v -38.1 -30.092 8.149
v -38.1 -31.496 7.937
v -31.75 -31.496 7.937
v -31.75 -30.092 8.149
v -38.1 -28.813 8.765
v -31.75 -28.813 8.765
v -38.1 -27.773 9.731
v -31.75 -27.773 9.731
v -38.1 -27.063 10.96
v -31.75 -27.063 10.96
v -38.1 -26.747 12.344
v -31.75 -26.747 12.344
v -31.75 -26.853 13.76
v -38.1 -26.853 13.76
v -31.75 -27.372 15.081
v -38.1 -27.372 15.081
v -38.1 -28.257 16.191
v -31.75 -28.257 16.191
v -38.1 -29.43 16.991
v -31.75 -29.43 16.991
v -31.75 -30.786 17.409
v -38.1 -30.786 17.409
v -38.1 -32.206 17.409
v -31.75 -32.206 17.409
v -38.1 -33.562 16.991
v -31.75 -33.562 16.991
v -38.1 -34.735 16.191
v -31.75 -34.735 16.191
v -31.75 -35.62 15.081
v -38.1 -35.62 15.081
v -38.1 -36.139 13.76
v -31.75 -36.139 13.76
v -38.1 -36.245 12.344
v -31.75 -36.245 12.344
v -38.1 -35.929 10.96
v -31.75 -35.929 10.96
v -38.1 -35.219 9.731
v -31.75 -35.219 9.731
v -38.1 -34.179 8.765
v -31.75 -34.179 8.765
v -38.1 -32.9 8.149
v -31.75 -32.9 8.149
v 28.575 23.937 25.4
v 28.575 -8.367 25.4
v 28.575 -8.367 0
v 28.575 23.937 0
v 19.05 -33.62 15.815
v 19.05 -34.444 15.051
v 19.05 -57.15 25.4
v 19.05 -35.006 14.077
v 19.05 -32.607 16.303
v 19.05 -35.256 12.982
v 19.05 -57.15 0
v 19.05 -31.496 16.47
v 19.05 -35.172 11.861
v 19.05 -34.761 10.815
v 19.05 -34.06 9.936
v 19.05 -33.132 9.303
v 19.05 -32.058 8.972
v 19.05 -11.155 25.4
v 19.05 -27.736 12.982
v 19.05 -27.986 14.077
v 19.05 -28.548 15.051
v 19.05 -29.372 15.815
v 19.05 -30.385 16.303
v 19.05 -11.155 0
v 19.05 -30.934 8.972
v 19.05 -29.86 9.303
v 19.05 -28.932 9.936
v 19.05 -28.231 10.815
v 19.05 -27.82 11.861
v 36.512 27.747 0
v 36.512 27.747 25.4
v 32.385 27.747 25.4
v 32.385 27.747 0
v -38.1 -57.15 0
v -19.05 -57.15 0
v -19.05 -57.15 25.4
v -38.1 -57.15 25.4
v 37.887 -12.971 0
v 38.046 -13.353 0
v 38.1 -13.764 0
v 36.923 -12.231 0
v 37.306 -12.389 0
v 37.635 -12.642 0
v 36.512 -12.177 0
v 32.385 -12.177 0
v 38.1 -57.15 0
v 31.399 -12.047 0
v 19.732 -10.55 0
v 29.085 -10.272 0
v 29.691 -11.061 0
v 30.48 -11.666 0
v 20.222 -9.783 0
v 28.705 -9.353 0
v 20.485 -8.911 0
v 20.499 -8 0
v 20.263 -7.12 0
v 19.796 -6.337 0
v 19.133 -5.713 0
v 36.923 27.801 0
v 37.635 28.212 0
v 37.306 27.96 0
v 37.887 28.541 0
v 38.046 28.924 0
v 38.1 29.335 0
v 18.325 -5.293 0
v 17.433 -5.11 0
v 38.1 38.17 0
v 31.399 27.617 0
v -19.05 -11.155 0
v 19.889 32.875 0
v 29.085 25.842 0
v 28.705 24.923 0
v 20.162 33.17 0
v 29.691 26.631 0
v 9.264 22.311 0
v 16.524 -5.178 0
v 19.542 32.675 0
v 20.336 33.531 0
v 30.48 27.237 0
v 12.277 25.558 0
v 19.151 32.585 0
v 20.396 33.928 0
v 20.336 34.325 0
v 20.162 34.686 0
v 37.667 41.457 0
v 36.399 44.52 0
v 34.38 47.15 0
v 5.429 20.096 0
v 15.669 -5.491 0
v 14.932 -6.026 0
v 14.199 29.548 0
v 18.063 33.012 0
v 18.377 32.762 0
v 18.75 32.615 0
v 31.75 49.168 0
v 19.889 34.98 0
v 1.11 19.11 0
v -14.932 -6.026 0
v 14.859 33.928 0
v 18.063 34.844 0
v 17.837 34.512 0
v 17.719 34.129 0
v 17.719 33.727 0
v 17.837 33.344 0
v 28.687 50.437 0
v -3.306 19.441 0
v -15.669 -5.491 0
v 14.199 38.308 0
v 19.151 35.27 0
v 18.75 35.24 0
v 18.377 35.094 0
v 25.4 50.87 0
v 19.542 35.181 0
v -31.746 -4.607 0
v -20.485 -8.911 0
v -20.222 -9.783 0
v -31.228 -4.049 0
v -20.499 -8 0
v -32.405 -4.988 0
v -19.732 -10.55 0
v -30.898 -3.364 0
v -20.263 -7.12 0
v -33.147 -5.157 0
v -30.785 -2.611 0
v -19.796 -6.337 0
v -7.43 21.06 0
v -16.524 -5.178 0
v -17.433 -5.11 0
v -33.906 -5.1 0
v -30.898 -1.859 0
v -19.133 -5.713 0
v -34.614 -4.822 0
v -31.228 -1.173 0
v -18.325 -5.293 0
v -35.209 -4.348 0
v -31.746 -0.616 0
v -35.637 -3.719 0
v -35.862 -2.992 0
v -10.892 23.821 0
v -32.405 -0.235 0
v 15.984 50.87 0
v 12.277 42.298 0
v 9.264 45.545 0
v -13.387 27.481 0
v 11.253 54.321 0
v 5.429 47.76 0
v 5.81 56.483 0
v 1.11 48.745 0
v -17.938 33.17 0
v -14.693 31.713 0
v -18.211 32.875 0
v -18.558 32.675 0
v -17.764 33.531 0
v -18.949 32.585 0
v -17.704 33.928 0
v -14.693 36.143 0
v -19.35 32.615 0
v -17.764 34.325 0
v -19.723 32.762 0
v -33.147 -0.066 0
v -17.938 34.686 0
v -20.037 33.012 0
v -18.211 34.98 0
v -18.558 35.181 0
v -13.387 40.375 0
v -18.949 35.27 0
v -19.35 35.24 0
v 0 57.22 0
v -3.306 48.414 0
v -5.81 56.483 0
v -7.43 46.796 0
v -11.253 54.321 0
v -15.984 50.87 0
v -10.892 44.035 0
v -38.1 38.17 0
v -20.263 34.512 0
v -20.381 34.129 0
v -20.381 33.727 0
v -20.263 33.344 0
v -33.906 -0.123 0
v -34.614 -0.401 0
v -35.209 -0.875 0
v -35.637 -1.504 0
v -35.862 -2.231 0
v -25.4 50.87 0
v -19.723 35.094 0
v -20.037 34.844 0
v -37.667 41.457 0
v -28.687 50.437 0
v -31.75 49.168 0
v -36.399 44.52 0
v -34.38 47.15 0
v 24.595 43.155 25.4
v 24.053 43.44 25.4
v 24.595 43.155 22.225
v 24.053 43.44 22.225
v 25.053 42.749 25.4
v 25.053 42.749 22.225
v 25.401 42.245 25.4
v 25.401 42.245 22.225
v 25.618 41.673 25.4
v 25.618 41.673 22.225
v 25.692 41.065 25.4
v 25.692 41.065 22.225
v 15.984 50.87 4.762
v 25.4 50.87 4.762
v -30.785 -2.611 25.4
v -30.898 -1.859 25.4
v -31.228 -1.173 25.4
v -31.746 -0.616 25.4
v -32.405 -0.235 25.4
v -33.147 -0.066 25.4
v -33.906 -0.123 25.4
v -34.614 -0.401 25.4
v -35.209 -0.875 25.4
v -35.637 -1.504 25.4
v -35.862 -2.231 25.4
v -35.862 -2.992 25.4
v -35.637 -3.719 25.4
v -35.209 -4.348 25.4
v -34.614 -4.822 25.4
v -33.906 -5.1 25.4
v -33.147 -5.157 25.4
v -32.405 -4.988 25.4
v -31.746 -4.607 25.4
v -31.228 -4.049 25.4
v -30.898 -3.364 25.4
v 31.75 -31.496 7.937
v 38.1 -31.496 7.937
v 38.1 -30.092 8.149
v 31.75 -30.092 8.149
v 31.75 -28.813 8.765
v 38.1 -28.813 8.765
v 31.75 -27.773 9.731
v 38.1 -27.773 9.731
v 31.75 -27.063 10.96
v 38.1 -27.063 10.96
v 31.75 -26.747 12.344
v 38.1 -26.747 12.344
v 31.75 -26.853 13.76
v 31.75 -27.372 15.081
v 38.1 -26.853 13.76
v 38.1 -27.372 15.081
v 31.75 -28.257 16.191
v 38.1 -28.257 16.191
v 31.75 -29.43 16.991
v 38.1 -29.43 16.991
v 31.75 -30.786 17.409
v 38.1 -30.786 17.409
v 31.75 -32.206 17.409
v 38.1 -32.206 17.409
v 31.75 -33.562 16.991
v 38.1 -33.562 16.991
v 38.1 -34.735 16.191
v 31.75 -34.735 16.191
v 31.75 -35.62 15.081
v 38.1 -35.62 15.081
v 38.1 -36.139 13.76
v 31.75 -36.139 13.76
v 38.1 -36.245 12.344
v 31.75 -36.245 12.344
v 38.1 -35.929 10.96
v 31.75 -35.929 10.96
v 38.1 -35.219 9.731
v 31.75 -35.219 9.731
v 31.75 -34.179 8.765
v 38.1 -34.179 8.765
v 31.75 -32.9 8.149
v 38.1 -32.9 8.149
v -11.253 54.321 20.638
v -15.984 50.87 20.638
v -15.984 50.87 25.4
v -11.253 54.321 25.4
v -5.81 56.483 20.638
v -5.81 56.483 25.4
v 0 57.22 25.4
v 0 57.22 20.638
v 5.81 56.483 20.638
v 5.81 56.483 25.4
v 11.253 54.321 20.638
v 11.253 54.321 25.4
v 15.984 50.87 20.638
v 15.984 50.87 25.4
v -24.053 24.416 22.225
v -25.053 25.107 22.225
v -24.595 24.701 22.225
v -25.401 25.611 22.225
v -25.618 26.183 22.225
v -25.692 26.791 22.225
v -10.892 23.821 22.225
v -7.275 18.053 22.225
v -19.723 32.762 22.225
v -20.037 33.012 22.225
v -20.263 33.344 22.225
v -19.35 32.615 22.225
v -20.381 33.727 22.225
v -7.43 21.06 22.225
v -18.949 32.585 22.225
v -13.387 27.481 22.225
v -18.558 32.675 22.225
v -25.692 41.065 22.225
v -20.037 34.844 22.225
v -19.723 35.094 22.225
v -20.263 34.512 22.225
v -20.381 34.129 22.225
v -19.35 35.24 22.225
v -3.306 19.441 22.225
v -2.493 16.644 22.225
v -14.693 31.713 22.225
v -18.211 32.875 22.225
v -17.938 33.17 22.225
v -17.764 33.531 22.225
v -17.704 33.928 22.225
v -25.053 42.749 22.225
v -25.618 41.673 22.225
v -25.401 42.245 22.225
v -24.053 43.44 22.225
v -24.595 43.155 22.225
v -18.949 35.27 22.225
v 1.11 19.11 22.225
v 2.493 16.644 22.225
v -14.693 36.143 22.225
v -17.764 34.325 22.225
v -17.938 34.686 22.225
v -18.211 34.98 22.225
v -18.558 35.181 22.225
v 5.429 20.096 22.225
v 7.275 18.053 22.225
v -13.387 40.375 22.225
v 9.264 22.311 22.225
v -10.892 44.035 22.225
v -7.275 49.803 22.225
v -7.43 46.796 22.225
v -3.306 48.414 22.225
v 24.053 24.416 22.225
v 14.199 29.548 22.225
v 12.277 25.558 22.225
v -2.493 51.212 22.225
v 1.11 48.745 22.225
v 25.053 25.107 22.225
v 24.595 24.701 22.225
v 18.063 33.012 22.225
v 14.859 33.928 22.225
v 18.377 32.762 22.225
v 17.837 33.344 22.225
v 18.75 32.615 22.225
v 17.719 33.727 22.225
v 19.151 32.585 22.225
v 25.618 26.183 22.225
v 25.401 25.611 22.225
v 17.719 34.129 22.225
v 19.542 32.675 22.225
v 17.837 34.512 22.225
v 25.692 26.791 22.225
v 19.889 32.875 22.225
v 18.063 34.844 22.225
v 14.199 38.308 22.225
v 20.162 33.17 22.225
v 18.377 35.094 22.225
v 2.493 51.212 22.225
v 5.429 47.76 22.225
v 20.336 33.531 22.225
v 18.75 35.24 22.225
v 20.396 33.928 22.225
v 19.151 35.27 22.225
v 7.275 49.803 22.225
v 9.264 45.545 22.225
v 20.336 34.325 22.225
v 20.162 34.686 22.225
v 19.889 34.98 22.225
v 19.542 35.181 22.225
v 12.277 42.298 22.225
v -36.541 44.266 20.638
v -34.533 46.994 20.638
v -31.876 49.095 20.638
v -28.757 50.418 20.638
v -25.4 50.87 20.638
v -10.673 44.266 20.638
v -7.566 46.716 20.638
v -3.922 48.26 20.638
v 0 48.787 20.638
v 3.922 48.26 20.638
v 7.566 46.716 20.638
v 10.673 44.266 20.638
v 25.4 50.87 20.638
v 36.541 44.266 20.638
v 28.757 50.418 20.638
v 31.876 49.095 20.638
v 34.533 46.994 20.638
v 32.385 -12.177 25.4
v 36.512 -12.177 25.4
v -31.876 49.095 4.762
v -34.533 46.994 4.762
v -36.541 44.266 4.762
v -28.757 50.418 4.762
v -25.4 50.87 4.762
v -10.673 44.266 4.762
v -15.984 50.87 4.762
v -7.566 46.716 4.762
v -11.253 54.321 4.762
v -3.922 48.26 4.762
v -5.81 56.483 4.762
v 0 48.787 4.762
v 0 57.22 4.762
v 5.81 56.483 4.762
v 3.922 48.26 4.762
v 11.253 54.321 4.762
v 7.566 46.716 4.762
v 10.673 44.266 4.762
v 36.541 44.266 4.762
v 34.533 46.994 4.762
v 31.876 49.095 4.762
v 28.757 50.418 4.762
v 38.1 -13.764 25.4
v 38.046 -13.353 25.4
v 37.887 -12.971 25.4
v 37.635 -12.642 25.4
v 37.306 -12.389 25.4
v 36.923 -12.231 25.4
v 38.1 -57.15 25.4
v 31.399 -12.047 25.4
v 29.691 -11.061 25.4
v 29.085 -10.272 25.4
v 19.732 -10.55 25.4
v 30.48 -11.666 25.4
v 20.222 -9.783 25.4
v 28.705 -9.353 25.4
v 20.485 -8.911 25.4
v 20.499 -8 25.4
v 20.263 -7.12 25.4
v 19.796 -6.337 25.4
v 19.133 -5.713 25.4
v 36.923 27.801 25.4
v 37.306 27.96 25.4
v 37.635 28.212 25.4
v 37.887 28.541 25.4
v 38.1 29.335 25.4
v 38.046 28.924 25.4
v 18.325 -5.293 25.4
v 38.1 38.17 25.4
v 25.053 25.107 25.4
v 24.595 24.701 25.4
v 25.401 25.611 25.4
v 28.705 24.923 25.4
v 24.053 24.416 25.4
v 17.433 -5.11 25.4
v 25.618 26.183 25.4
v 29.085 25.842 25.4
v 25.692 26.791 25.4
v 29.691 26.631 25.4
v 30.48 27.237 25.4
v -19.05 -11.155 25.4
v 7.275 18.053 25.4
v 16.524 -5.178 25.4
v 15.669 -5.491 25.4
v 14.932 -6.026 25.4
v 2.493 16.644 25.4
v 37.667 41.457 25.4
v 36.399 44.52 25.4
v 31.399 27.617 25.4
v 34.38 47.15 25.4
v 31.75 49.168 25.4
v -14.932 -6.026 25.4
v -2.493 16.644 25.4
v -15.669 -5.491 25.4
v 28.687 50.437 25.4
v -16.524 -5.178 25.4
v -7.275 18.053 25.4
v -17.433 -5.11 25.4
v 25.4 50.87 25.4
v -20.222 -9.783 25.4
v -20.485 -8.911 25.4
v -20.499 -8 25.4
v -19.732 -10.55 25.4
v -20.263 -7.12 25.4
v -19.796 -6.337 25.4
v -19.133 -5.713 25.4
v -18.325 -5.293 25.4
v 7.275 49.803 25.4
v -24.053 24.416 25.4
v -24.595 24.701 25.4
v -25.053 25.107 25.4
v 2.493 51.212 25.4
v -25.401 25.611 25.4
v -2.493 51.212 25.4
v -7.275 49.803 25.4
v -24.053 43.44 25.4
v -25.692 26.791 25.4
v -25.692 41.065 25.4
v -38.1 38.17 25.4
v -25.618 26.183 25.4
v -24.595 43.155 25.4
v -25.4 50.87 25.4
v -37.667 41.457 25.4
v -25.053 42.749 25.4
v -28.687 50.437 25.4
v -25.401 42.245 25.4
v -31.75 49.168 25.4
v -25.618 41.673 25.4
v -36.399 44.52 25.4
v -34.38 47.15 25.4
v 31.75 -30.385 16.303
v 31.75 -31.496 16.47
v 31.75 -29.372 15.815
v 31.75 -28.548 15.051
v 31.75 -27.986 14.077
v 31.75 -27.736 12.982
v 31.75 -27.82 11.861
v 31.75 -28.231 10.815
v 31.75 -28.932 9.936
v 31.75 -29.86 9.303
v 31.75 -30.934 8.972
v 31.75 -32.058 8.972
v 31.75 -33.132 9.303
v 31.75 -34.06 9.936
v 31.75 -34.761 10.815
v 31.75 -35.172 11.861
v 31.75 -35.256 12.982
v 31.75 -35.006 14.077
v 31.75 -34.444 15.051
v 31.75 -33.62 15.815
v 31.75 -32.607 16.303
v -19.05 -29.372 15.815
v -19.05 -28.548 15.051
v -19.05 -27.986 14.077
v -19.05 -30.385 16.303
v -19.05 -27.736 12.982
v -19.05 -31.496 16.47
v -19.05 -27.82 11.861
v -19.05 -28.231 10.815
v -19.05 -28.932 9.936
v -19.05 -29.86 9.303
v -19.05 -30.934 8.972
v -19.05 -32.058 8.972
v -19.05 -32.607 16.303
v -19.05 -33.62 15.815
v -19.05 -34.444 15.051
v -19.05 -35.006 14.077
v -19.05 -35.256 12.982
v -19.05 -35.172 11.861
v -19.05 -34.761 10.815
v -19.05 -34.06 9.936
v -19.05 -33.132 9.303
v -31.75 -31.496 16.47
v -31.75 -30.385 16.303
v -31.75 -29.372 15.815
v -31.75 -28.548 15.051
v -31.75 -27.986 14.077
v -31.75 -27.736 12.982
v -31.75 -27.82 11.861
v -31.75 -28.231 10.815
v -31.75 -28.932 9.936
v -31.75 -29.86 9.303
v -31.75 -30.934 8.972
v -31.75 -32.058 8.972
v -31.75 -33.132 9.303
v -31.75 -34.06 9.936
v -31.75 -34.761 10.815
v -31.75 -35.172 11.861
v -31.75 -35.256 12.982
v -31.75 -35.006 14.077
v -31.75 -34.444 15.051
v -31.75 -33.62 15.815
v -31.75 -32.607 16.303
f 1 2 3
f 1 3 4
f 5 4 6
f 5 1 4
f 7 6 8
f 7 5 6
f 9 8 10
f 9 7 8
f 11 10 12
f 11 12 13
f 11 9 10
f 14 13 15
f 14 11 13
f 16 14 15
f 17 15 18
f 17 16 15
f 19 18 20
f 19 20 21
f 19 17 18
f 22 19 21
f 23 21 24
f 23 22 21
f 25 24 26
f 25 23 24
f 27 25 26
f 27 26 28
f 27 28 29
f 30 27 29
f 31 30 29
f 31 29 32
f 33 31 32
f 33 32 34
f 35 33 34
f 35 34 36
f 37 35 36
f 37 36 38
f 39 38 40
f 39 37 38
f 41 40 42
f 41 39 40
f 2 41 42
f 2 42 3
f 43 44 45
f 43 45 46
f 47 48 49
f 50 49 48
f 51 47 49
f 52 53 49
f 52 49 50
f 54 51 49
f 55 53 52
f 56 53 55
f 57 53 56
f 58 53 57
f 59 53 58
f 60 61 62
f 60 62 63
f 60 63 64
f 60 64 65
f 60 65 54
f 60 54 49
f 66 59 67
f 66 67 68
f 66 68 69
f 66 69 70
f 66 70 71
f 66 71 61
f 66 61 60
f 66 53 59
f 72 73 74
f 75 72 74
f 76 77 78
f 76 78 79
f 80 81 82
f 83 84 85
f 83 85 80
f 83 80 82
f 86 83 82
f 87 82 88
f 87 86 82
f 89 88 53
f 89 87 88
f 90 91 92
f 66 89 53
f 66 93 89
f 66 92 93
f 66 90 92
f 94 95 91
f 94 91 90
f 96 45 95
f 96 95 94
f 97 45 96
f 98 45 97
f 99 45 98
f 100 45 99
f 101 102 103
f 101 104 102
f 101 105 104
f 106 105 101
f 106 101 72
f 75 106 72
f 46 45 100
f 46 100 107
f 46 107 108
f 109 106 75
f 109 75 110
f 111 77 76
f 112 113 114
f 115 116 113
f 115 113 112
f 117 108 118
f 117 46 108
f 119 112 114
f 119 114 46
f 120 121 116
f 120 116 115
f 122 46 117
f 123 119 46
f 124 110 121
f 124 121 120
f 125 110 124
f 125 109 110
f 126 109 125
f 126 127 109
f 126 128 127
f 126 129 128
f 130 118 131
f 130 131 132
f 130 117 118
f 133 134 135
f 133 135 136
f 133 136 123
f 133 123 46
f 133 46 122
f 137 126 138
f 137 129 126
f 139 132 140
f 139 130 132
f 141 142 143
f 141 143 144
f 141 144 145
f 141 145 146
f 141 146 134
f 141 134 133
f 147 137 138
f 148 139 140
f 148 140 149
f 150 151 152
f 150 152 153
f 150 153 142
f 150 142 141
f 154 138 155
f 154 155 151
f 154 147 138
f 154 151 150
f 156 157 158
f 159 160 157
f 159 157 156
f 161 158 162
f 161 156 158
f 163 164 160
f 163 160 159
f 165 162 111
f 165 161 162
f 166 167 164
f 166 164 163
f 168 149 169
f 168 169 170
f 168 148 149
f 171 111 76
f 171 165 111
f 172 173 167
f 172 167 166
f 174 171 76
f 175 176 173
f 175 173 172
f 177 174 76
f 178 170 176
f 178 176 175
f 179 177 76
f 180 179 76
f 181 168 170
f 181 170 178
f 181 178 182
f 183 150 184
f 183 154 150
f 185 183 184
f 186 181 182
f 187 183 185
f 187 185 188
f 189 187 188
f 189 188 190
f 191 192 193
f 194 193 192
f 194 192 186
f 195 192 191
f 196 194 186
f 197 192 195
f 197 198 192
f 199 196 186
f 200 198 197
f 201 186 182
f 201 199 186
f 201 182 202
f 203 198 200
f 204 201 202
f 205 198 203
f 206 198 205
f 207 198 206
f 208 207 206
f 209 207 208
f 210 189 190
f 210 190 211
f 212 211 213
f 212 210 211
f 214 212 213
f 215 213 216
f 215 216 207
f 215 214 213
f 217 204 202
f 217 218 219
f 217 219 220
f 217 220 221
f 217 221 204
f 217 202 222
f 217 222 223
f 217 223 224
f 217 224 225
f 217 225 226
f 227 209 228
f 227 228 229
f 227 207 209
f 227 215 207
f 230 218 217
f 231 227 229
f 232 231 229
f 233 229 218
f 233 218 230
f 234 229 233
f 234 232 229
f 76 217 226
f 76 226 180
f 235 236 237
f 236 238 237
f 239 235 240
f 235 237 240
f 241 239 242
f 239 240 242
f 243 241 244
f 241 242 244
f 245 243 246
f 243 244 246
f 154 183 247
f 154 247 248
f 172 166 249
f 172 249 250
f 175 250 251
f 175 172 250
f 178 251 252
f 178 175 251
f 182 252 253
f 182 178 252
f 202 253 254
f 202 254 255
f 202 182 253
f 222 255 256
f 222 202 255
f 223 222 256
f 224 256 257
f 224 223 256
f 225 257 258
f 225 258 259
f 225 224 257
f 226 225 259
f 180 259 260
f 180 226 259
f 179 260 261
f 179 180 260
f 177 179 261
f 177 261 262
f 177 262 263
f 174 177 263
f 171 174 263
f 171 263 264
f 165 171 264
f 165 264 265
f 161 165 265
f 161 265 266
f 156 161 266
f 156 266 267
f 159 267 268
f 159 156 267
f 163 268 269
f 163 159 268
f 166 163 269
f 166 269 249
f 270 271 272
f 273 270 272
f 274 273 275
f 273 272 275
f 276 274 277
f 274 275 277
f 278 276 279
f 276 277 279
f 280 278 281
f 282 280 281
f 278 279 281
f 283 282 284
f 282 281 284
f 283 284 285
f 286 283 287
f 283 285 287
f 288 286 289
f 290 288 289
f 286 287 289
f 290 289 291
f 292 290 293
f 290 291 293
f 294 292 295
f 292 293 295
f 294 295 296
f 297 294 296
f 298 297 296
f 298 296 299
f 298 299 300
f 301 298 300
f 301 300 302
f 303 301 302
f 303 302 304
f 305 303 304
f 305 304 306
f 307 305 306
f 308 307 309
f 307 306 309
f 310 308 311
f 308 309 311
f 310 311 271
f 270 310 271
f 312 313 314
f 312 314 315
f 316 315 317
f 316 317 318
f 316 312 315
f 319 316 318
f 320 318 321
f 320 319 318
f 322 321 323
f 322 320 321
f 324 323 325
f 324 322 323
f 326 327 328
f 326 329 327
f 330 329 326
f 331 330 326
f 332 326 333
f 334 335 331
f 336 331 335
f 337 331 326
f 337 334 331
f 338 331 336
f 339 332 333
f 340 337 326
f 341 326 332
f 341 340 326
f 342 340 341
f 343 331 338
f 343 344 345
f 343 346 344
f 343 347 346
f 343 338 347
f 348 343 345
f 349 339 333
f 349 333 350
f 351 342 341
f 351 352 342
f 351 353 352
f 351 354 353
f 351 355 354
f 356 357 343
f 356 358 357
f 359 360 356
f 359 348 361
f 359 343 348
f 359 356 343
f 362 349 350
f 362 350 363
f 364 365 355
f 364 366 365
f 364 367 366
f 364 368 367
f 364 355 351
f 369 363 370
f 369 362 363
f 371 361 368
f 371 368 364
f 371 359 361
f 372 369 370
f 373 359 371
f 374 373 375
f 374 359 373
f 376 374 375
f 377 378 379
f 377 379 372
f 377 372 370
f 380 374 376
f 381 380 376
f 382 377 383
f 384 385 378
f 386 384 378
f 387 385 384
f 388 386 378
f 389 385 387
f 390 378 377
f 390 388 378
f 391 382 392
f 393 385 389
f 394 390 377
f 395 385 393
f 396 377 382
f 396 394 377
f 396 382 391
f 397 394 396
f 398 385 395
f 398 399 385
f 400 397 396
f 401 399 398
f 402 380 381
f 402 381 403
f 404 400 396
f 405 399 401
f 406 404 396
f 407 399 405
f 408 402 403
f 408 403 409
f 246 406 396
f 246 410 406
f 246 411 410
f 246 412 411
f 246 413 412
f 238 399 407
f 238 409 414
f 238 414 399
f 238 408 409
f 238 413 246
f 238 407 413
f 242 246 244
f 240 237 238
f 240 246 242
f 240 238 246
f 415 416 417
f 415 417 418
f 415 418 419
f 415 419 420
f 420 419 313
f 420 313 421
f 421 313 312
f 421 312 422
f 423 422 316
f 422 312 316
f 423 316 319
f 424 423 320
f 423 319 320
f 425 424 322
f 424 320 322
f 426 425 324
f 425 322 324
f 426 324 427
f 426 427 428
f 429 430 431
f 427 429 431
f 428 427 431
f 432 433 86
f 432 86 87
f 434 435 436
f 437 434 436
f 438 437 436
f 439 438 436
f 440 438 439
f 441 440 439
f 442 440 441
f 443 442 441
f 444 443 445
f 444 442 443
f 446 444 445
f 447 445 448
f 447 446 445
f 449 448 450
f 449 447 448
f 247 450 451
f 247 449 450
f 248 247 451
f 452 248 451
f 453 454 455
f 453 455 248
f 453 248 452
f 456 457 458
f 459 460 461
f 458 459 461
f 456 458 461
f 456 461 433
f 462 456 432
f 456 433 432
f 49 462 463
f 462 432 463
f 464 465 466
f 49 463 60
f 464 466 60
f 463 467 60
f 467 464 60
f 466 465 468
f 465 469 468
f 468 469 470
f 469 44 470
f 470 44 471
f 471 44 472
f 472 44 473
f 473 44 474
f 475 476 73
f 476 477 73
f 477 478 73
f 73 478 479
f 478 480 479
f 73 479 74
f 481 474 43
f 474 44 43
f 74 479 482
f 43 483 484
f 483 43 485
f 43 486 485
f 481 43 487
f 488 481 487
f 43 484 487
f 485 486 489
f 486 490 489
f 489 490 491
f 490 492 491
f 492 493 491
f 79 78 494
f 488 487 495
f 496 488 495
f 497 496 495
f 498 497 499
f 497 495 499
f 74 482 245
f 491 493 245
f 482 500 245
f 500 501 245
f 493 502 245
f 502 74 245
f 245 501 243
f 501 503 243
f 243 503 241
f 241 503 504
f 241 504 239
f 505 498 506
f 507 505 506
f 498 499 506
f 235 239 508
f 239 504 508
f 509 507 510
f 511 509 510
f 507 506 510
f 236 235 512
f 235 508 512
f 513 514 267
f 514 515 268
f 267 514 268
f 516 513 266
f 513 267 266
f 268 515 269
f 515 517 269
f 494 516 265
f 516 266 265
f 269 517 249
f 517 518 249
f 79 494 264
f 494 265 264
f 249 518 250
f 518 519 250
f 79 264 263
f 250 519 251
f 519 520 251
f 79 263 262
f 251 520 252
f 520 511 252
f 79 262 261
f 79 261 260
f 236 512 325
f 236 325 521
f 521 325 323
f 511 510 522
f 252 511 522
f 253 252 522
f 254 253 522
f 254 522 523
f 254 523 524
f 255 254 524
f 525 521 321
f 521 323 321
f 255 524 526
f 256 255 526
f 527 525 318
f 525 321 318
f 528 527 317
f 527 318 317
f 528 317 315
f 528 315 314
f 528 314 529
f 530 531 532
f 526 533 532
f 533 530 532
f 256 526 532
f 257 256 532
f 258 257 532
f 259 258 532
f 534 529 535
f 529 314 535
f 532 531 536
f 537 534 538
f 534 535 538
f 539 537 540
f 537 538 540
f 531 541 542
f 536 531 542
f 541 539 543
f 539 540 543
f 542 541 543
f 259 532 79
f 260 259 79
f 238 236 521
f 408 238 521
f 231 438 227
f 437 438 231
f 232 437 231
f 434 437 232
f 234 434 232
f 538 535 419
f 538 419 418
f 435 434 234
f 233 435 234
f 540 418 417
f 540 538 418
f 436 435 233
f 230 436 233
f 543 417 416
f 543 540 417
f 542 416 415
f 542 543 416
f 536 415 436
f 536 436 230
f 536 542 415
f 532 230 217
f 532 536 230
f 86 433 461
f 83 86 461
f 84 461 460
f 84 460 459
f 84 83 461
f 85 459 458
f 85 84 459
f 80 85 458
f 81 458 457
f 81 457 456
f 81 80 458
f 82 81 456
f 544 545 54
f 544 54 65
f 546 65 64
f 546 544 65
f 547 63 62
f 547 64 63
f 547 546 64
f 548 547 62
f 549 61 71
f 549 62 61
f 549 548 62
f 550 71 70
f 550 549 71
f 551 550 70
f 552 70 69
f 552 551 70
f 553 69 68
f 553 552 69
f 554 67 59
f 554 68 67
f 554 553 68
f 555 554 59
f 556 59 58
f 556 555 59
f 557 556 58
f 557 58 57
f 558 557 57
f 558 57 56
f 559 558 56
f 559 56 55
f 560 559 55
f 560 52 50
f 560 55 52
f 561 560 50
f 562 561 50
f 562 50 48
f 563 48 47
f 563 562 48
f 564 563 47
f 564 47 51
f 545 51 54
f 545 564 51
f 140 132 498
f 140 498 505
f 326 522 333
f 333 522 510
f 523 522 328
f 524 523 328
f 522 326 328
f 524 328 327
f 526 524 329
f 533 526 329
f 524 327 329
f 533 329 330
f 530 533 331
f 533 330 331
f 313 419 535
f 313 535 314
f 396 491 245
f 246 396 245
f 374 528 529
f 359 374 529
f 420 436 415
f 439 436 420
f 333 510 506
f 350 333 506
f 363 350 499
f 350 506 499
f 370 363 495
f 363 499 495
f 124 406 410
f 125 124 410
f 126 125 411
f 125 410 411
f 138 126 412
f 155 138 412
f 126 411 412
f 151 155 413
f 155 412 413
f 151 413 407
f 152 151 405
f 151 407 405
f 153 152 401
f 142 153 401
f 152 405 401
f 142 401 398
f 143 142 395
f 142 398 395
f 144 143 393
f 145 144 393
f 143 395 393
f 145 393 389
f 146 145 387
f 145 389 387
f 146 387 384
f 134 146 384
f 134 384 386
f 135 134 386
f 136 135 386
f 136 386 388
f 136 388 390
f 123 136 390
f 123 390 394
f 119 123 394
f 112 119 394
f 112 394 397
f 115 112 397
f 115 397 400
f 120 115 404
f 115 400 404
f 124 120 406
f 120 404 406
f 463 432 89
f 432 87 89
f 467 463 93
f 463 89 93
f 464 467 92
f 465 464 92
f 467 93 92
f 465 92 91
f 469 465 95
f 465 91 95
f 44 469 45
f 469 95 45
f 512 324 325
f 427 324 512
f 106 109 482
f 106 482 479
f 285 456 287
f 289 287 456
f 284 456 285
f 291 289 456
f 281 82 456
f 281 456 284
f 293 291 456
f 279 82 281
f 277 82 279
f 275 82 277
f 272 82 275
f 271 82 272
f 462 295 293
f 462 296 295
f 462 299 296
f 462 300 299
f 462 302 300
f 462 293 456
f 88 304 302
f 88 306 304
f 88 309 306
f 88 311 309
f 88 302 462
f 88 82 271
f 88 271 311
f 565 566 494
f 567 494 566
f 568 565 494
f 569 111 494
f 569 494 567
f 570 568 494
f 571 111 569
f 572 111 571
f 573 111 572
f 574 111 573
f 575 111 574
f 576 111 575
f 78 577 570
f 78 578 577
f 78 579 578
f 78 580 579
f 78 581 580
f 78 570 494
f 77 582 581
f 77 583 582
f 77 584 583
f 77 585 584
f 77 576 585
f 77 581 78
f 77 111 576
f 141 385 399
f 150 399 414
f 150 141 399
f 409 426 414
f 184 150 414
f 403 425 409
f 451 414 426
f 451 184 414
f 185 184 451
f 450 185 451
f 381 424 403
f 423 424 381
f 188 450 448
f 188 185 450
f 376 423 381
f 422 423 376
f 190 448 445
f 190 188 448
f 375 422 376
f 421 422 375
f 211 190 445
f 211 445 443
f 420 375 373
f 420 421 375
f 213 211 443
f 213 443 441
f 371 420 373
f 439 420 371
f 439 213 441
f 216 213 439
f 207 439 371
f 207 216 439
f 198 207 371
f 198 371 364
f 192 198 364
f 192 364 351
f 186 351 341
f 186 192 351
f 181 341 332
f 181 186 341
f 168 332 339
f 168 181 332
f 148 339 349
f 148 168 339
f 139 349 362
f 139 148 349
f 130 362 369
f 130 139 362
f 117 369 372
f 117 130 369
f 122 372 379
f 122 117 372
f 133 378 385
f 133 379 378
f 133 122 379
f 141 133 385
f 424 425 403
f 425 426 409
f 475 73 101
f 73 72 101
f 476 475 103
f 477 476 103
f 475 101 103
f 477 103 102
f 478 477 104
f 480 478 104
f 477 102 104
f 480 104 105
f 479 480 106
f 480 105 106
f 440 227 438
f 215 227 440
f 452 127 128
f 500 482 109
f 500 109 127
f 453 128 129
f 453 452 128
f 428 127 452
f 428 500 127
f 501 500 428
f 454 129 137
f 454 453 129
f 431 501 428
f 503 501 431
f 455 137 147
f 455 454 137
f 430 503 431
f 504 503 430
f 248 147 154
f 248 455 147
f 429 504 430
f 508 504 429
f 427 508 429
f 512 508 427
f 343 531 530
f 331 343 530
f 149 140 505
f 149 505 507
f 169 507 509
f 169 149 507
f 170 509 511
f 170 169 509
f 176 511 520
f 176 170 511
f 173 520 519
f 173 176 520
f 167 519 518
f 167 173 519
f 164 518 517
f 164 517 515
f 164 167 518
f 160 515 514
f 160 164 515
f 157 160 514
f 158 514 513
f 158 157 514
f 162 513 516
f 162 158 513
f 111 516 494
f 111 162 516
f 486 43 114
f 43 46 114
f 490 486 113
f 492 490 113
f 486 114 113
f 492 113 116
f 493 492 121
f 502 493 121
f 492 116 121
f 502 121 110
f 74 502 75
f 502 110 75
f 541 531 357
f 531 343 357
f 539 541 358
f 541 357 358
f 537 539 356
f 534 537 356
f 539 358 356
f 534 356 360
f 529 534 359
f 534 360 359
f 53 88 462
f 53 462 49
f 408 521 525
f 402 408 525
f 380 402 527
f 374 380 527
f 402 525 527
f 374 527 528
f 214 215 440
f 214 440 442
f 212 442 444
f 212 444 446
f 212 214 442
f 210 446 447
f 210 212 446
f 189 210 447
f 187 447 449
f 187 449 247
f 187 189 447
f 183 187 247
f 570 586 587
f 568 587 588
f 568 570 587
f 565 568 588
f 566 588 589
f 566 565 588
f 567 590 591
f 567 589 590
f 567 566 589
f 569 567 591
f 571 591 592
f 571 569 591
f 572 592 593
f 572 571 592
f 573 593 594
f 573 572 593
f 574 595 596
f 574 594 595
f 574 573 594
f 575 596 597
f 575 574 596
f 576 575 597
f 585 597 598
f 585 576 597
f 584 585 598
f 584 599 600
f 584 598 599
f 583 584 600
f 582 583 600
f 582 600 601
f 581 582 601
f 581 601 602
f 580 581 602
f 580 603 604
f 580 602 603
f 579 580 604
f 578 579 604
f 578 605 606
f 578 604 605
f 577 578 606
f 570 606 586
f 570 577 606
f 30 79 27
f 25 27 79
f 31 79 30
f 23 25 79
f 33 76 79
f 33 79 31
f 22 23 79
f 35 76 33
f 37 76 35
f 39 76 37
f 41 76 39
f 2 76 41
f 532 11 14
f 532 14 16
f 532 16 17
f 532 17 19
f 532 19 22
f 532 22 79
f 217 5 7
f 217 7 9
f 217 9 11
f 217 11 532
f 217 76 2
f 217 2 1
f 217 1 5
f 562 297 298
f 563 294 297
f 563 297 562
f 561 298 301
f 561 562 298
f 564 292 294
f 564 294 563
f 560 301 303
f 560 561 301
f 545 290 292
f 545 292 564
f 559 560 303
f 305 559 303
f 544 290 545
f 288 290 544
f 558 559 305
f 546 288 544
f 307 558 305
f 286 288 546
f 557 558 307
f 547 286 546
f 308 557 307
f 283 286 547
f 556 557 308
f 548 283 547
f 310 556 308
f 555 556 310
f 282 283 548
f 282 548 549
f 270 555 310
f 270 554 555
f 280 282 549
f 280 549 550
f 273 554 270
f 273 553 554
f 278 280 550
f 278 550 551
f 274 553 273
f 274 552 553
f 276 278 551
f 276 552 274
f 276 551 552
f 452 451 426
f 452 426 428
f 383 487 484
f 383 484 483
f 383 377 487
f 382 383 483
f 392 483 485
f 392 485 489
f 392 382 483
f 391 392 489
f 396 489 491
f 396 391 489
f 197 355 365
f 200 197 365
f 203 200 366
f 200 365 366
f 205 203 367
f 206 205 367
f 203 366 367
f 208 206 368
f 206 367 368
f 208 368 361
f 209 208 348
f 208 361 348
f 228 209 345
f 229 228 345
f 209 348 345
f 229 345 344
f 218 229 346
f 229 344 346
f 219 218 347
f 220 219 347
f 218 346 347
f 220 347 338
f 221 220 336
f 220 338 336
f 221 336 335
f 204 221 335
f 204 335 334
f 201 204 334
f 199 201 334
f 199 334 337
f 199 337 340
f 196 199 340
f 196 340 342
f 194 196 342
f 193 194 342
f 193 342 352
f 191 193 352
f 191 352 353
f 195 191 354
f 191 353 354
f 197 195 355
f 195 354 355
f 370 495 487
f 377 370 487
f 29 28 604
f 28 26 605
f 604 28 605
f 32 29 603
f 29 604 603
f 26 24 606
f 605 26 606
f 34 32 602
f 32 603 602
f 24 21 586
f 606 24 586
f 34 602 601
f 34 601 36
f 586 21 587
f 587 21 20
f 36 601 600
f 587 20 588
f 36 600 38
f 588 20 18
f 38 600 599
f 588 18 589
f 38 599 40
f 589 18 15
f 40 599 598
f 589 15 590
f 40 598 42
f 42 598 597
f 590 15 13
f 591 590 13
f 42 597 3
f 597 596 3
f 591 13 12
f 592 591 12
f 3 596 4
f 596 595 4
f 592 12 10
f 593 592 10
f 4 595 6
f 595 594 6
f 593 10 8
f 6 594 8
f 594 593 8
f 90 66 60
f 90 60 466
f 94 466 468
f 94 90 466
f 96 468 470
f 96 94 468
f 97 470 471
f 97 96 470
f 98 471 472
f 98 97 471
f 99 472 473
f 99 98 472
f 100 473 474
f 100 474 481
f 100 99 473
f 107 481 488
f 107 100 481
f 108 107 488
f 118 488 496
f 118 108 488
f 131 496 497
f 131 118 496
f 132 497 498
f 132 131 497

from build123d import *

# Parameters (mm, degrees)
SKETCH1_R               = 14.859
SKETCH1_R_2             = 2.5527
BOSS_EXTRUDE1_DEPTH     = 25.4
FILLET1_R               = 12.7
CUT_EXTRUDE1_DEPTH      = 3.175
FILLET2_R               = 2.54
SKETCH3_R               = 1.3462
CUT_EXTRUDE2_DEPTH      = 22.225
CUT_EXTRUDE3_START      = -76.2
SKETCH4_R               = 3.7703125
CUT_EXTRUDE3_DEPTH      = 76.2
SKETCH5_W               = 85.90580112
SKETCH5_H               = 15.875
CUT_EXTRUDE4_DEPTH      = 23.622
CUT_EXTRUDE4_DEPTH_BACK = 6.604
CUT_EXTRUDE5_START      = -25.4
SKETCH6_W               = 9.525
SKETCH6_H               = 39.923791379
CUT_EXTRUDE5_DEPTH      = 25.4
FILLET3_R               = 3.81
FILLET4_R               = 1.5875
SKETCH7_R               = 4.7625
CUT_EXTRUDE6_DEPTH      = 6.35


with BuildPart() as part:
    # Sketch1 → Boss-Extrude1 (new body)
    with BuildSketch(Plane.XY):
        with BuildLine():
            Line((38.1, -57.15), (19.05, -57.15))
            Line((19.05, -57.15), (19.05, -11.154684967))
            ThreePointArc((19.05, -11.154684967), (19.796266411, -6.337498405), (14.931562131, -6.026287555))
            Line((14.931562131, -6.026287555), (-14.931562131, -6.026287555))
            ThreePointArc((-14.931562131, -6.026287555), (-19.796266411, -6.337498405), (-19.05, -11.154684967))
            Line((-19.05, -11.154684967), (-19.05, -57.15))
            Line((-19.05, -57.15), (-38.1, -57.15))
            Line((-38.1, -57.15), (-38.1, 50.869712445))
            Line((-38.1, 50.869712445), (-15.983846846, 50.869712445))
            ThreePointArc((-15.983846846, 50.869712445), (0, 57.219712445), (15.983846846, 50.869712445))
            Line((15.983846846, 50.869712445), (38.1, 50.869712445))
            Line((38.1, 50.869712445), (38.1, -57.15))
        make_face()
        with Locations((0, 33.927912445)):
            Circle(SKETCH1_R, mode=Mode.SUBTRACT)
        with Locations((-33.3375, -2.611452402)):
            Circle(SKETCH1_R_2, mode=Mode.SUBTRACT)
        with Locations((33.3375, -2.611452402)):
            Circle(SKETCH1_R_2, mode=Mode.SUBTRACT)
    extrude(amount=BOSS_EXTRUDE1_DEPTH)

    # Fillet1
    fillet1_edges = [part.edges().sort_by_distance(p)[0] for p in [
        (-38.1, 50.869712445, 12.7),
        (38.1, 50.869712445, 12.7),
    ]]
    fillet(fillet1_edges, radius=FILLET1_R)

    # Sketch2 → Cut-Extrude1 (cut)
    with BuildSketch(Plane.XY.offset(25.4)):
        with BuildLine():
            Line((25.6921, 25.037912445), (25.6921, 42.817912445))
            Line((25.6921, 42.817912445), (7.274838916, 49.802912445))
            ThreePointArc((7.274838916, 49.802912445), (0, 51.390412445), (-7.274838916, 49.802912445))
            Line((-7.274838916, 49.802912445), (-25.6921, 42.817912445))
            Line((-25.6921, 42.817912445), (-25.6921, 25.037912445))
            Line((-25.6921, 25.037912445), (-7.274838916, 18.052912445))
            ThreePointArc((-7.274838916, 18.052912445), (0, 16.465412445), (7.274838916, 18.052912445))
            Line((7.274838916, 18.052912445), (25.6921, 25.037912445))
        make_face()
    extrude(amount=-CUT_EXTRUDE1_DEPTH, mode=Mode.SUBTRACT)

    # Fillet2
    fillet2_edges = [part.edges().sort_by_distance(p)[0] for p in [
        (-25.6921, 42.817912445, 23.8125),
        (25.6921, 42.817912445, 23.8125),
        (25.6921, 25.037912445, 23.8125),
        (-25.6921, 25.037912445, 23.8125),
    ]]
    fillet(fillet2_edges, radius=FILLET2_R)

    # Sketch3 → Cut-Extrude2 (cut)
    with BuildSketch(Plane.XY.offset(22.225)):
        with Locations((-19.05, 33.927912445)):
            Circle(SKETCH3_R)
        with Locations((19.05, 33.927912445)):
            Circle(SKETCH3_R)
    extrude(amount=-CUT_EXTRUDE2_DEPTH, mode=Mode.SUBTRACT)

    # Sketch4 → Cut-Extrude3 (cut)
    with BuildSketch(Plane.ZY.offset(38.1).offset(CUT_EXTRUDE3_START)):
        with Locations((12.7, -31.496)):
            Circle(SKETCH4_R)
    extrude(amount=CUT_EXTRUDE3_DEPTH, mode=Mode.SUBTRACT)

    # Sketch5 → Cut-Extrude4 (cut, two sides)
    with BuildSketch(Plane(origin=(0, 50.869712445, 0), x_dir=(1, 0, 0), z_dir=(0, 1, 0))) as cut_extrude4_sk:
        with Locations((0, -12.7)):
            Rectangle(SKETCH5_W, SKETCH5_H)
    extrude(amount=CUT_EXTRUDE4_DEPTH, mode=Mode.SUBTRACT)
    extrude(cut_extrude4_sk.sketch, amount=-CUT_EXTRUDE4_DEPTH_BACK, mode=Mode.SUBTRACT)

    # Sketch6 → Cut-Extrude5 (cut)
    with BuildSketch(Plane(origin=(0, 0, 0), x_dir=(-1, 0, 0), z_dir=(0, 0, -1)).offset(CUT_EXTRUDE5_START)):
        with Locations((-33.3375, 7.785139318)):
            Rectangle(SKETCH6_W, SKETCH6_H)
    extrude(amount=CUT_EXTRUDE5_DEPTH, mode=Mode.SUBTRACT)

    # Fillet3
    fillet3_edges = [part.edges().sort_by_distance(p)[0] for p in [
        (28.575, 27.747035008, 12.7),
        (28.575, -12.176756371, 12.7),
    ]]
    fillet(fillet3_edges, radius=FILLET3_R)

    # Fillet4
    fillet4_edges = [part.edges().sort_by_distance(p)[0] for p in [
        (38.1, -12.176756371, 12.7),
        (38.1, 27.747035008, 12.7),
    ]]
    fillet(fillet4_edges, radius=FILLET4_R)

    # Sketch7 → Cut-Extrude6 (cut)
    with BuildSketch(Plane(origin=(38.1, 0, 0), x_dir=(0, 0, -1), z_dir=(1, 0, 0))):
        with Locations((-12.7, -31.496)):
            Circle(SKETCH7_R)
    cut_extrude6 = extrude(amount=-CUT_EXTRUDE6_DEPTH, mode=Mode.SUBTRACT)

    # Mirror1: Cut-Extrude6 across plane
    add(cut_extrude6.mirror(Plane(origin=(0, 0, 0), x_dir=(0, 0, 1), z_dir=(1, 0, 0))), mode=Mode.SUBTRACT)


solid = part.part
